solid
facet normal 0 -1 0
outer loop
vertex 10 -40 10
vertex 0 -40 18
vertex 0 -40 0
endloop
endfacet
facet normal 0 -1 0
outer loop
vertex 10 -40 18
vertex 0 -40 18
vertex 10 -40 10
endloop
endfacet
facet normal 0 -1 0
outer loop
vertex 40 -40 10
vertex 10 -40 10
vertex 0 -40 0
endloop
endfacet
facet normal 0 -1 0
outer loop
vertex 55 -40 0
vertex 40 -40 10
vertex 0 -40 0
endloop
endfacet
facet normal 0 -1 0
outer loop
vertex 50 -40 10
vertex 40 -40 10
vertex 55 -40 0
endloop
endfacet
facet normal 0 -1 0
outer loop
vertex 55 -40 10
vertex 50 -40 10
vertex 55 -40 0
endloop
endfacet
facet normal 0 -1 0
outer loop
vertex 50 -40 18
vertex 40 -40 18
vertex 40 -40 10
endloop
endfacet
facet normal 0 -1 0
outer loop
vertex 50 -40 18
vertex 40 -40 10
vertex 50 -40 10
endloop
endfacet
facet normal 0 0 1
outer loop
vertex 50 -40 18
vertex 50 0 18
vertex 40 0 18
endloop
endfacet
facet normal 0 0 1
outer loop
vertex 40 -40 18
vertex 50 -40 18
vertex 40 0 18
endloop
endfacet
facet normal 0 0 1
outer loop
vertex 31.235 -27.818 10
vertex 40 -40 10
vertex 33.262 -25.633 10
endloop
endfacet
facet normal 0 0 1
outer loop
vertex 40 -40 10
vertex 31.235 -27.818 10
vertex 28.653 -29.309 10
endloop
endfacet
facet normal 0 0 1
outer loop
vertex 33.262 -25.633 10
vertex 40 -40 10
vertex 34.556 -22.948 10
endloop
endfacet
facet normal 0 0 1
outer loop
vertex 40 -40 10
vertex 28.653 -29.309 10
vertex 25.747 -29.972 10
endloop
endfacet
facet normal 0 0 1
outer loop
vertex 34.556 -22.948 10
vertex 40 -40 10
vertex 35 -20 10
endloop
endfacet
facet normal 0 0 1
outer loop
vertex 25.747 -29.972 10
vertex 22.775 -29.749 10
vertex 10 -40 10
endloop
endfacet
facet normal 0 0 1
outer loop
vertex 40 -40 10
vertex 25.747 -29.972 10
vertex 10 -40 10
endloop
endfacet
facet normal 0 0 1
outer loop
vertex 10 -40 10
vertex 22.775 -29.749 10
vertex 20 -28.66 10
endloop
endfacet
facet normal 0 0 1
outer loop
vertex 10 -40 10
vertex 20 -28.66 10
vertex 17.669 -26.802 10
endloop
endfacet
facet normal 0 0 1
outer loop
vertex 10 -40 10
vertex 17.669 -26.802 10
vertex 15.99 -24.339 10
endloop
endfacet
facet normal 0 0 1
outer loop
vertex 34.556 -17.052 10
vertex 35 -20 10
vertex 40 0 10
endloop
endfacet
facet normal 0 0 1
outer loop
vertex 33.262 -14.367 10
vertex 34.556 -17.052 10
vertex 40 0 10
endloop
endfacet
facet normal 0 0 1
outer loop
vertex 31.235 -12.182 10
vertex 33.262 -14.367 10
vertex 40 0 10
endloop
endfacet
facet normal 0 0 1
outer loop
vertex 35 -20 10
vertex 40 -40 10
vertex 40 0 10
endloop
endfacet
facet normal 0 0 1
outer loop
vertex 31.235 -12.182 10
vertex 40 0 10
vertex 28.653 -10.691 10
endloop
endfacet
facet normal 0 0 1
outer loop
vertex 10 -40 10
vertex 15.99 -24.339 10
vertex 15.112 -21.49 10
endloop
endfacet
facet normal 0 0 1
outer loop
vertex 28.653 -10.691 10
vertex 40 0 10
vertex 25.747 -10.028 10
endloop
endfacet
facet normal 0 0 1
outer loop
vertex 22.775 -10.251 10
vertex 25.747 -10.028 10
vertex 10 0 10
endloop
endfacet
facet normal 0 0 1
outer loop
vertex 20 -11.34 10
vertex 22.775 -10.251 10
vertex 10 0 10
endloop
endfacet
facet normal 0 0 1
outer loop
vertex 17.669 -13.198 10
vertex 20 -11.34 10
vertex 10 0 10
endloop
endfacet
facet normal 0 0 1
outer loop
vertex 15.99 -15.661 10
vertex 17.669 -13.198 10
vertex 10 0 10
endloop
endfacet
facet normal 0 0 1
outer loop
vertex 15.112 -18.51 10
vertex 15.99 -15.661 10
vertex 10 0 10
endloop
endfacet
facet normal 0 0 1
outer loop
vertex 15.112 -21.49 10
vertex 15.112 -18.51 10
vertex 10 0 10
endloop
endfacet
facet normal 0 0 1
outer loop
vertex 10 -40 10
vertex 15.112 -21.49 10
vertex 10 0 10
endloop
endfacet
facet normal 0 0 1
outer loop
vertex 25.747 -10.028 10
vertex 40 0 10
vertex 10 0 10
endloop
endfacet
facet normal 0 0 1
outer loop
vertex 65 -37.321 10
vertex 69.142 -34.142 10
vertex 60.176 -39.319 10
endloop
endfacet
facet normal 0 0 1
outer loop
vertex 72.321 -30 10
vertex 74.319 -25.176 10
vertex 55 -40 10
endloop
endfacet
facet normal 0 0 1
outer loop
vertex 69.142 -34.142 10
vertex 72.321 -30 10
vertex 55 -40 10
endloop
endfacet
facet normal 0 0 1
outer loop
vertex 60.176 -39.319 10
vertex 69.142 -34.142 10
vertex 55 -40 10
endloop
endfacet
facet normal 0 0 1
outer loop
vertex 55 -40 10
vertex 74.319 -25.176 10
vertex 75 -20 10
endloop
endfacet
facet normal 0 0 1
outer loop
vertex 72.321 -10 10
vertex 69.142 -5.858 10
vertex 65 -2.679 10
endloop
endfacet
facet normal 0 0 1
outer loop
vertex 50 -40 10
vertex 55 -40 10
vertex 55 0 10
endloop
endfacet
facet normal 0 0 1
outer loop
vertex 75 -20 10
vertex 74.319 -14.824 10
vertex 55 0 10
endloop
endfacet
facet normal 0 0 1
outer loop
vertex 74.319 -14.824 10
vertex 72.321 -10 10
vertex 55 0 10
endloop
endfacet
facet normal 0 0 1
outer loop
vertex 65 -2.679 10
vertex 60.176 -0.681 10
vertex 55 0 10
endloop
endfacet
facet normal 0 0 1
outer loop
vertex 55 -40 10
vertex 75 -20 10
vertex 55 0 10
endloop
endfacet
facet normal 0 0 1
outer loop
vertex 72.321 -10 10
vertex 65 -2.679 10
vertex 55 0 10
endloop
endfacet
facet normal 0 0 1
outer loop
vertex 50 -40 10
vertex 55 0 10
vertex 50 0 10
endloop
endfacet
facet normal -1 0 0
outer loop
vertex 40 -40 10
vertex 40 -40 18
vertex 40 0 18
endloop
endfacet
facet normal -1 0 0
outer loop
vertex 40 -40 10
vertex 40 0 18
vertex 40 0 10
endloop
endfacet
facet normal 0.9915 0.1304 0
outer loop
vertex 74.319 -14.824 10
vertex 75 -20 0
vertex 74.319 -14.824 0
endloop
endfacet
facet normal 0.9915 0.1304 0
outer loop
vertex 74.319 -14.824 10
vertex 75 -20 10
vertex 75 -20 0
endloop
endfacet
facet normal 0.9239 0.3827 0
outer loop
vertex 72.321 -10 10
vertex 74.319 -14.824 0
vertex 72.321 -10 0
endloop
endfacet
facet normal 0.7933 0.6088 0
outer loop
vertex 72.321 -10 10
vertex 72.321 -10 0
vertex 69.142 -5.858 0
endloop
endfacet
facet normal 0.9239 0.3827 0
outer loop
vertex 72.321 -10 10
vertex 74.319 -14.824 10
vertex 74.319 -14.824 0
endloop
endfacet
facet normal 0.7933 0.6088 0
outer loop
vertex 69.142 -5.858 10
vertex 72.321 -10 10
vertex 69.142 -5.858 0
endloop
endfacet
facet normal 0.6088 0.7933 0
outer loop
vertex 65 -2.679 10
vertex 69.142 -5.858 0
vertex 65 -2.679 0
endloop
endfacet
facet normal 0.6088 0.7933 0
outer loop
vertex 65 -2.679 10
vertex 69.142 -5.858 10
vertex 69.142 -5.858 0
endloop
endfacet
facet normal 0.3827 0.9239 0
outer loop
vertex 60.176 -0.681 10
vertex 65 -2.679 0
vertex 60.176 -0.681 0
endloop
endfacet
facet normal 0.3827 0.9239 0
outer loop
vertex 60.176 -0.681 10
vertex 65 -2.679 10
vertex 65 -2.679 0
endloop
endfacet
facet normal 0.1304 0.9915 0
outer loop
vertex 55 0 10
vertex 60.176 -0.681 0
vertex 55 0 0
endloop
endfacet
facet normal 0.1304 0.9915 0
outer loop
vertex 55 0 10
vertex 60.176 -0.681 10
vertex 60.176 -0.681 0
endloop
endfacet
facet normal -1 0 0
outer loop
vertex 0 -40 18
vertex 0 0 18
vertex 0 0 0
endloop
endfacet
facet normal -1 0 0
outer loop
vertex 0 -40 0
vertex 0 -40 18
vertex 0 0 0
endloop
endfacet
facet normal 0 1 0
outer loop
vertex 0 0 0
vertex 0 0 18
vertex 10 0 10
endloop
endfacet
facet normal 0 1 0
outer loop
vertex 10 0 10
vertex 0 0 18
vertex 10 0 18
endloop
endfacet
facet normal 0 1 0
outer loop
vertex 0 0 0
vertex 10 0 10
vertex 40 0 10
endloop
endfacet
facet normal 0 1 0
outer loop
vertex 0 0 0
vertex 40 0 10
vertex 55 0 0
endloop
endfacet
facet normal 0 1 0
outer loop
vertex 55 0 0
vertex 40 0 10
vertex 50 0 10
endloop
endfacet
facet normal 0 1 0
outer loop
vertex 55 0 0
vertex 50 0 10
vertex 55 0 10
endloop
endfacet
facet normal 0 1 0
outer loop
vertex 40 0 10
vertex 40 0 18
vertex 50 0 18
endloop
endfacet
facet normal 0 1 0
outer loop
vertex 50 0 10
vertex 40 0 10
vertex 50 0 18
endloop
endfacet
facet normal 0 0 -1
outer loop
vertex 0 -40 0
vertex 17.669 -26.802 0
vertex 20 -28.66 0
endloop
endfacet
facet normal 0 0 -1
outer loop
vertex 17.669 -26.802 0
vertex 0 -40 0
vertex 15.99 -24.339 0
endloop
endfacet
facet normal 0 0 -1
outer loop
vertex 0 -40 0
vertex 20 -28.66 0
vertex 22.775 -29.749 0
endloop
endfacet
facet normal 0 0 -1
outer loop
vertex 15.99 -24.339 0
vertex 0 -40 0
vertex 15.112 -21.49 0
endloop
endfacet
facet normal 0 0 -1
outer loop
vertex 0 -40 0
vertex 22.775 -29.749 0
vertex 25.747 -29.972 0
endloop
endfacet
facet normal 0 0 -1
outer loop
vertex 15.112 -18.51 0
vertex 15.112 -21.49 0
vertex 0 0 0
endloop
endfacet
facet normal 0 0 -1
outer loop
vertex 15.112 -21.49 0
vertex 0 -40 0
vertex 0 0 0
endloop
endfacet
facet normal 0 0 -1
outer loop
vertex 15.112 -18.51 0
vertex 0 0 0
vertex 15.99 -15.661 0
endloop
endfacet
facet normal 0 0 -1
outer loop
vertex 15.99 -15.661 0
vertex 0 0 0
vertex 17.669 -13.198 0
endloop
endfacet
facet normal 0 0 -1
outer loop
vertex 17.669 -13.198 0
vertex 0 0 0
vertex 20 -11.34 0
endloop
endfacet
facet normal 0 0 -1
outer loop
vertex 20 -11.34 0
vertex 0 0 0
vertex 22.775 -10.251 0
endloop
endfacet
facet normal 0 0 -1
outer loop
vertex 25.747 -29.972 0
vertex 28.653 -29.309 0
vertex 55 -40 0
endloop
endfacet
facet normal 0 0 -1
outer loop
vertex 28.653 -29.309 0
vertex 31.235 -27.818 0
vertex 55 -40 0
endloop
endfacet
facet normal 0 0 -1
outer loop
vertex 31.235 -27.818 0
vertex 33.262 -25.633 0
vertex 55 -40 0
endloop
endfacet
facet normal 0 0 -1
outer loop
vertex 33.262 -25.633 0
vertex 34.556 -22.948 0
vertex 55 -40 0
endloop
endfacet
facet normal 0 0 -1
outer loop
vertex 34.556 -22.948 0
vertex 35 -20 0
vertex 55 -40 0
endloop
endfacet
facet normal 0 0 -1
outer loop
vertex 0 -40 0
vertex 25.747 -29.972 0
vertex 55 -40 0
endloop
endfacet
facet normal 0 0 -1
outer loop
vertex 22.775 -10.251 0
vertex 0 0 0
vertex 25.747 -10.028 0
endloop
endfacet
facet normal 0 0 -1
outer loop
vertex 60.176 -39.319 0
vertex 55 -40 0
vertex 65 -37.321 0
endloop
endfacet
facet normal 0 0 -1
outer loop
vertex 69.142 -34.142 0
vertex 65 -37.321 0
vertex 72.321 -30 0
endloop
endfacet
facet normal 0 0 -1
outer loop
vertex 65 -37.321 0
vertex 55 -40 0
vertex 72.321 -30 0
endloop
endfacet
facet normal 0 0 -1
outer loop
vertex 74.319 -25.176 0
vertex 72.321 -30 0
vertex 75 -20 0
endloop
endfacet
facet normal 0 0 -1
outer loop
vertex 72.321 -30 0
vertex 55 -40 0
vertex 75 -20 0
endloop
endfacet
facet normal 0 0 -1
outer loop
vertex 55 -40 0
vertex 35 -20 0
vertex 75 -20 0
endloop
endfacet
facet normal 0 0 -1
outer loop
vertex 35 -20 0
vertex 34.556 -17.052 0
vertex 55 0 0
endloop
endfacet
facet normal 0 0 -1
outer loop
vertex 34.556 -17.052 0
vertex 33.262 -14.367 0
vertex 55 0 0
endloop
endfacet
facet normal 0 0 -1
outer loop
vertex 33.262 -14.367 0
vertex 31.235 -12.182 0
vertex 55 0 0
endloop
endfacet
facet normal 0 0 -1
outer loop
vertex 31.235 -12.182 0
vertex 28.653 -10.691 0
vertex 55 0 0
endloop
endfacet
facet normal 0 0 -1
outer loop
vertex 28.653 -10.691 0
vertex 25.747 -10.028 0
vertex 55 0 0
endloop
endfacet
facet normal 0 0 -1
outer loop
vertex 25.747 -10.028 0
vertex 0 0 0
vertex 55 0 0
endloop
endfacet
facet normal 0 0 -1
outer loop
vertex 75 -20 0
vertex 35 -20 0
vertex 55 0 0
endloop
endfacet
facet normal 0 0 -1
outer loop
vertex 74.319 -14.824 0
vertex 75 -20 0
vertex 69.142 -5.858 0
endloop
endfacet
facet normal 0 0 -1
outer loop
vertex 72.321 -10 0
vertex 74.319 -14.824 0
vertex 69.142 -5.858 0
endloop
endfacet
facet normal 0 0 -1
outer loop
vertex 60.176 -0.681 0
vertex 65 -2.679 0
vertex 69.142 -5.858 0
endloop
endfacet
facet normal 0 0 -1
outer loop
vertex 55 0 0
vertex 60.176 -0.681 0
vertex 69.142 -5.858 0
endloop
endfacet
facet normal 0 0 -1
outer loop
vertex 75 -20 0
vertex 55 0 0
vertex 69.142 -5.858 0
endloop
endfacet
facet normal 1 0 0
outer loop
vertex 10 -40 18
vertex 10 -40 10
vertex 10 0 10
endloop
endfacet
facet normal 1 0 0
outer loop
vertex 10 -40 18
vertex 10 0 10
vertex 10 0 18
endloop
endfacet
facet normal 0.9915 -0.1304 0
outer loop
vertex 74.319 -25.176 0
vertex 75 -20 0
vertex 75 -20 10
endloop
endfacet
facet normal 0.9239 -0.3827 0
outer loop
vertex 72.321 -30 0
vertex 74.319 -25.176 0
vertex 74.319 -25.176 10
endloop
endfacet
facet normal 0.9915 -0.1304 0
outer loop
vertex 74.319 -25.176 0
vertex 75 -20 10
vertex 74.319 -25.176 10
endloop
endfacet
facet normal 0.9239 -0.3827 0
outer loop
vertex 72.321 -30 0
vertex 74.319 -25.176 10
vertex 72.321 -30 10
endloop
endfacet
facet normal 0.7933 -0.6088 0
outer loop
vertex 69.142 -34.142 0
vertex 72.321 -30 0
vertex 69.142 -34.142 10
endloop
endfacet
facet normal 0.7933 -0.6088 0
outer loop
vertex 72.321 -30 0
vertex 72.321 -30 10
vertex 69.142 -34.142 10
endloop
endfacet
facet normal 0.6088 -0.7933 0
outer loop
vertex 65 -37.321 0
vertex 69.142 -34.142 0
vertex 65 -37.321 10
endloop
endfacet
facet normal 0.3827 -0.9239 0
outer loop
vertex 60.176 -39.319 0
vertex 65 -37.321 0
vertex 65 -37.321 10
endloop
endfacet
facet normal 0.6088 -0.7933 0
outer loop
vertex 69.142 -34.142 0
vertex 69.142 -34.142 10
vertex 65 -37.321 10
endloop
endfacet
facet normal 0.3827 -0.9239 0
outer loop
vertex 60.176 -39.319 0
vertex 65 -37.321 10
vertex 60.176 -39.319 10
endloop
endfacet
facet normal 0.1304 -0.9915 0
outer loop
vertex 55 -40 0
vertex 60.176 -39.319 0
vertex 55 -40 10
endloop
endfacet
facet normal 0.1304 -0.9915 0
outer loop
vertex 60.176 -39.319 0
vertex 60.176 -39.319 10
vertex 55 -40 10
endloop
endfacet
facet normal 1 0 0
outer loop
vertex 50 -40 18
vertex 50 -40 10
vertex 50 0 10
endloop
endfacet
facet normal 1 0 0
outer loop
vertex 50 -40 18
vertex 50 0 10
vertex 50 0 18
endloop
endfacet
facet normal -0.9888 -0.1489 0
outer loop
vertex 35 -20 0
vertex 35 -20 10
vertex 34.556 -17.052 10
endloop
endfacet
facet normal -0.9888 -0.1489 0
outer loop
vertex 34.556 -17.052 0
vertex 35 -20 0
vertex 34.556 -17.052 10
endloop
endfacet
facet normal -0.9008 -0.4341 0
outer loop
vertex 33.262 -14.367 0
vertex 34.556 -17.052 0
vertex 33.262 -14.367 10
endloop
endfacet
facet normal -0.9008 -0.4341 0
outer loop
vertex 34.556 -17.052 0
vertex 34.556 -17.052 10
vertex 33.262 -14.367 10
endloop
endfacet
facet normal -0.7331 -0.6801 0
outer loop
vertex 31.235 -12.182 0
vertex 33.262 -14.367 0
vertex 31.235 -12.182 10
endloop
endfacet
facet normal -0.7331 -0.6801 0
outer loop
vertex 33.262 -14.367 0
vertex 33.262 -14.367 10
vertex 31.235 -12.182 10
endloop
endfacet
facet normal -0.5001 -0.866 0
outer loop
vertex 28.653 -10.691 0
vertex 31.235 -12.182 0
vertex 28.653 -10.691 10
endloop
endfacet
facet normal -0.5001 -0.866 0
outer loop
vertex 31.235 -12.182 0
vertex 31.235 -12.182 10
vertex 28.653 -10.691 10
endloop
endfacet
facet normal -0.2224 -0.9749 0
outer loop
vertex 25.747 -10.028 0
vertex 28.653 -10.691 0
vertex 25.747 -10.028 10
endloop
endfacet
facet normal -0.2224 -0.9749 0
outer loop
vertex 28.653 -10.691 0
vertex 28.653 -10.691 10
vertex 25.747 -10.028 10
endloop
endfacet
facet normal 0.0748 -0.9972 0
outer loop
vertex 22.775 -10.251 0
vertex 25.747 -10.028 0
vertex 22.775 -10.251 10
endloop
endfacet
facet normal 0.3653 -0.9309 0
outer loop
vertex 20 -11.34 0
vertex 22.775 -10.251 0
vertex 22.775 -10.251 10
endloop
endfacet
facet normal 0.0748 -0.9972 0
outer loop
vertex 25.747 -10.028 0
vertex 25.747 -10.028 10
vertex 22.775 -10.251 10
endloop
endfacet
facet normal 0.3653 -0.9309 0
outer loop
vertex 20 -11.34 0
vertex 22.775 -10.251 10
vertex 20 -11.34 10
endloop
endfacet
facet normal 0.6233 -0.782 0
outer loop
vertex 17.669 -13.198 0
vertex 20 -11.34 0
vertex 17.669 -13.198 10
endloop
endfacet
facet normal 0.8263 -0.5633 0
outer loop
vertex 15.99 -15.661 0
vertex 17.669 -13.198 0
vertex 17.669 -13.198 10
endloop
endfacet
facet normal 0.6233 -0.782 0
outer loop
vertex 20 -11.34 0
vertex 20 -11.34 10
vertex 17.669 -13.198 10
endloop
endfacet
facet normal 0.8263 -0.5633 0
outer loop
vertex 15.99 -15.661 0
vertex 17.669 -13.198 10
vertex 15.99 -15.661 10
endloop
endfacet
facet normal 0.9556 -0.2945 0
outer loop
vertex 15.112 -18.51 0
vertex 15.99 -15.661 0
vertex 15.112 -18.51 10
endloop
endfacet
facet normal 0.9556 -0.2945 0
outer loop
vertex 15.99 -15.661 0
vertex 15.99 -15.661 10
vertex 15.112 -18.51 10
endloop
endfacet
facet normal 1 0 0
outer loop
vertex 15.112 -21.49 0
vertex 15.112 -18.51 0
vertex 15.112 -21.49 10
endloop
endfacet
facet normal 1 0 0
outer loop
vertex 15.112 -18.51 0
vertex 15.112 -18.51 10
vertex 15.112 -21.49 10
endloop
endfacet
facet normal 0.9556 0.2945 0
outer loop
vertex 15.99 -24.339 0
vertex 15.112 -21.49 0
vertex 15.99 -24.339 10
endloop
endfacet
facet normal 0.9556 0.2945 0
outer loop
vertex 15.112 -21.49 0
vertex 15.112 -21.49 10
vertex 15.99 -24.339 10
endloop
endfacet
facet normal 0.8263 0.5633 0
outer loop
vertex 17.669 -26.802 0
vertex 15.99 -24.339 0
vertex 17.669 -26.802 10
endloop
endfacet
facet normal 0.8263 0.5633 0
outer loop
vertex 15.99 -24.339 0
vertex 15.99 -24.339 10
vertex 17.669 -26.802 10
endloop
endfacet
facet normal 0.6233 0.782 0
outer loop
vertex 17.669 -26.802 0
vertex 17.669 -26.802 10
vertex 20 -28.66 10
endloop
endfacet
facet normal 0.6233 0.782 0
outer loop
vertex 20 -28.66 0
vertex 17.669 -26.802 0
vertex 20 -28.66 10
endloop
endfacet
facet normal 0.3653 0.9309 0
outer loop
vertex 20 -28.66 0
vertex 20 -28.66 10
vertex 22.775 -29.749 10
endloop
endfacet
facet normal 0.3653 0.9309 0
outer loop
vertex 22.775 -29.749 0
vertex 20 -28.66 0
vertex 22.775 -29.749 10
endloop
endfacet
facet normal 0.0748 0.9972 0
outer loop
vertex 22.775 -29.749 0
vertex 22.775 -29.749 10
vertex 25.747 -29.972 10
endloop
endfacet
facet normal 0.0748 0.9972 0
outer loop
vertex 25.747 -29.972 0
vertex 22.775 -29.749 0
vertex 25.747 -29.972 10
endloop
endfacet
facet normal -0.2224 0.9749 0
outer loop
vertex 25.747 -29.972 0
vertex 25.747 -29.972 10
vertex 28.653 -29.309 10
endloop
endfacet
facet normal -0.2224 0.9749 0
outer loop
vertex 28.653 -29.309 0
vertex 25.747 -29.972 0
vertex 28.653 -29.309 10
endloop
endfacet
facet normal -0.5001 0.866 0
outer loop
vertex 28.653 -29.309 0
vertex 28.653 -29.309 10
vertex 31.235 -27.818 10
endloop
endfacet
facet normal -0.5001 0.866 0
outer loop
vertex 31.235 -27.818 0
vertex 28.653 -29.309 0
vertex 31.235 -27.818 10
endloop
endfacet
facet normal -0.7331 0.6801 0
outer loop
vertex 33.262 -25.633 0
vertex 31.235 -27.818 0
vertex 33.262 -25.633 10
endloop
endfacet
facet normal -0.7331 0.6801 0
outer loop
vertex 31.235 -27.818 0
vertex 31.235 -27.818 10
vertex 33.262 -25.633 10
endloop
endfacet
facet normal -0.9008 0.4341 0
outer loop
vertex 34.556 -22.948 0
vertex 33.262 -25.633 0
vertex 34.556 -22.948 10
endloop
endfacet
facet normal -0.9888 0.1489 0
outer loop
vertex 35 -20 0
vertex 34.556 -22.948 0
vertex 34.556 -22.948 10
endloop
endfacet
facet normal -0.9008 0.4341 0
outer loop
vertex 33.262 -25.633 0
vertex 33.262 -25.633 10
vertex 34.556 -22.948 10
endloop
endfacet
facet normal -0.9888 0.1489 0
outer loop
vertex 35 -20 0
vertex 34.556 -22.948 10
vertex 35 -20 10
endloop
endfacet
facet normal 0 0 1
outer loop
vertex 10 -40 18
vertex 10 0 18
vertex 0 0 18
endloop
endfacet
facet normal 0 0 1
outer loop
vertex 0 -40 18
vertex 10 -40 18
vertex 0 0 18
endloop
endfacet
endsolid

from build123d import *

# Parameters (mm, degrees)
F1_DEPTH = 40
F2_R     = 19.99999
F3_R     = 10
F4_DEPTH = 10


# Not quite as in the source:
# - a fillet or chamfer is up to 0.001 mm smaller than in the source, because OpenCascade refuses the exact size


with BuildPart() as f1:
    # F0 (on Front) → F1 (new body)
    with BuildSketch(Plane.XZ):
        Polygon((0, 18), (0, 0), (75, 0), (75, 10), (50, 10), (50, 18), (40, 18), (40, 10), (10, 10), (10, 18), align=None)
    extrude(amount=F1_DEPTH)

    # F2 (radius 20 in the source; OpenCascade refuses exactly that, so slightly less here)
    f2_edges = [f1.edges().sort_by_distance(p)[0] for p in [
        (75, -40, 5),
        (75, 0, 5),
    ]]
    fillet(f2_edges, radius=F2_R)

    # F3 (on face) → F4 (cut, through all)
    with BuildSketch(Plane.XY.offset(10)):
        with Locations((25, -20)):
            Circle(F3_R)
    extrude(amount=-F4_DEPTH, mode=Mode.SUBTRACT)


solid = f1.part
